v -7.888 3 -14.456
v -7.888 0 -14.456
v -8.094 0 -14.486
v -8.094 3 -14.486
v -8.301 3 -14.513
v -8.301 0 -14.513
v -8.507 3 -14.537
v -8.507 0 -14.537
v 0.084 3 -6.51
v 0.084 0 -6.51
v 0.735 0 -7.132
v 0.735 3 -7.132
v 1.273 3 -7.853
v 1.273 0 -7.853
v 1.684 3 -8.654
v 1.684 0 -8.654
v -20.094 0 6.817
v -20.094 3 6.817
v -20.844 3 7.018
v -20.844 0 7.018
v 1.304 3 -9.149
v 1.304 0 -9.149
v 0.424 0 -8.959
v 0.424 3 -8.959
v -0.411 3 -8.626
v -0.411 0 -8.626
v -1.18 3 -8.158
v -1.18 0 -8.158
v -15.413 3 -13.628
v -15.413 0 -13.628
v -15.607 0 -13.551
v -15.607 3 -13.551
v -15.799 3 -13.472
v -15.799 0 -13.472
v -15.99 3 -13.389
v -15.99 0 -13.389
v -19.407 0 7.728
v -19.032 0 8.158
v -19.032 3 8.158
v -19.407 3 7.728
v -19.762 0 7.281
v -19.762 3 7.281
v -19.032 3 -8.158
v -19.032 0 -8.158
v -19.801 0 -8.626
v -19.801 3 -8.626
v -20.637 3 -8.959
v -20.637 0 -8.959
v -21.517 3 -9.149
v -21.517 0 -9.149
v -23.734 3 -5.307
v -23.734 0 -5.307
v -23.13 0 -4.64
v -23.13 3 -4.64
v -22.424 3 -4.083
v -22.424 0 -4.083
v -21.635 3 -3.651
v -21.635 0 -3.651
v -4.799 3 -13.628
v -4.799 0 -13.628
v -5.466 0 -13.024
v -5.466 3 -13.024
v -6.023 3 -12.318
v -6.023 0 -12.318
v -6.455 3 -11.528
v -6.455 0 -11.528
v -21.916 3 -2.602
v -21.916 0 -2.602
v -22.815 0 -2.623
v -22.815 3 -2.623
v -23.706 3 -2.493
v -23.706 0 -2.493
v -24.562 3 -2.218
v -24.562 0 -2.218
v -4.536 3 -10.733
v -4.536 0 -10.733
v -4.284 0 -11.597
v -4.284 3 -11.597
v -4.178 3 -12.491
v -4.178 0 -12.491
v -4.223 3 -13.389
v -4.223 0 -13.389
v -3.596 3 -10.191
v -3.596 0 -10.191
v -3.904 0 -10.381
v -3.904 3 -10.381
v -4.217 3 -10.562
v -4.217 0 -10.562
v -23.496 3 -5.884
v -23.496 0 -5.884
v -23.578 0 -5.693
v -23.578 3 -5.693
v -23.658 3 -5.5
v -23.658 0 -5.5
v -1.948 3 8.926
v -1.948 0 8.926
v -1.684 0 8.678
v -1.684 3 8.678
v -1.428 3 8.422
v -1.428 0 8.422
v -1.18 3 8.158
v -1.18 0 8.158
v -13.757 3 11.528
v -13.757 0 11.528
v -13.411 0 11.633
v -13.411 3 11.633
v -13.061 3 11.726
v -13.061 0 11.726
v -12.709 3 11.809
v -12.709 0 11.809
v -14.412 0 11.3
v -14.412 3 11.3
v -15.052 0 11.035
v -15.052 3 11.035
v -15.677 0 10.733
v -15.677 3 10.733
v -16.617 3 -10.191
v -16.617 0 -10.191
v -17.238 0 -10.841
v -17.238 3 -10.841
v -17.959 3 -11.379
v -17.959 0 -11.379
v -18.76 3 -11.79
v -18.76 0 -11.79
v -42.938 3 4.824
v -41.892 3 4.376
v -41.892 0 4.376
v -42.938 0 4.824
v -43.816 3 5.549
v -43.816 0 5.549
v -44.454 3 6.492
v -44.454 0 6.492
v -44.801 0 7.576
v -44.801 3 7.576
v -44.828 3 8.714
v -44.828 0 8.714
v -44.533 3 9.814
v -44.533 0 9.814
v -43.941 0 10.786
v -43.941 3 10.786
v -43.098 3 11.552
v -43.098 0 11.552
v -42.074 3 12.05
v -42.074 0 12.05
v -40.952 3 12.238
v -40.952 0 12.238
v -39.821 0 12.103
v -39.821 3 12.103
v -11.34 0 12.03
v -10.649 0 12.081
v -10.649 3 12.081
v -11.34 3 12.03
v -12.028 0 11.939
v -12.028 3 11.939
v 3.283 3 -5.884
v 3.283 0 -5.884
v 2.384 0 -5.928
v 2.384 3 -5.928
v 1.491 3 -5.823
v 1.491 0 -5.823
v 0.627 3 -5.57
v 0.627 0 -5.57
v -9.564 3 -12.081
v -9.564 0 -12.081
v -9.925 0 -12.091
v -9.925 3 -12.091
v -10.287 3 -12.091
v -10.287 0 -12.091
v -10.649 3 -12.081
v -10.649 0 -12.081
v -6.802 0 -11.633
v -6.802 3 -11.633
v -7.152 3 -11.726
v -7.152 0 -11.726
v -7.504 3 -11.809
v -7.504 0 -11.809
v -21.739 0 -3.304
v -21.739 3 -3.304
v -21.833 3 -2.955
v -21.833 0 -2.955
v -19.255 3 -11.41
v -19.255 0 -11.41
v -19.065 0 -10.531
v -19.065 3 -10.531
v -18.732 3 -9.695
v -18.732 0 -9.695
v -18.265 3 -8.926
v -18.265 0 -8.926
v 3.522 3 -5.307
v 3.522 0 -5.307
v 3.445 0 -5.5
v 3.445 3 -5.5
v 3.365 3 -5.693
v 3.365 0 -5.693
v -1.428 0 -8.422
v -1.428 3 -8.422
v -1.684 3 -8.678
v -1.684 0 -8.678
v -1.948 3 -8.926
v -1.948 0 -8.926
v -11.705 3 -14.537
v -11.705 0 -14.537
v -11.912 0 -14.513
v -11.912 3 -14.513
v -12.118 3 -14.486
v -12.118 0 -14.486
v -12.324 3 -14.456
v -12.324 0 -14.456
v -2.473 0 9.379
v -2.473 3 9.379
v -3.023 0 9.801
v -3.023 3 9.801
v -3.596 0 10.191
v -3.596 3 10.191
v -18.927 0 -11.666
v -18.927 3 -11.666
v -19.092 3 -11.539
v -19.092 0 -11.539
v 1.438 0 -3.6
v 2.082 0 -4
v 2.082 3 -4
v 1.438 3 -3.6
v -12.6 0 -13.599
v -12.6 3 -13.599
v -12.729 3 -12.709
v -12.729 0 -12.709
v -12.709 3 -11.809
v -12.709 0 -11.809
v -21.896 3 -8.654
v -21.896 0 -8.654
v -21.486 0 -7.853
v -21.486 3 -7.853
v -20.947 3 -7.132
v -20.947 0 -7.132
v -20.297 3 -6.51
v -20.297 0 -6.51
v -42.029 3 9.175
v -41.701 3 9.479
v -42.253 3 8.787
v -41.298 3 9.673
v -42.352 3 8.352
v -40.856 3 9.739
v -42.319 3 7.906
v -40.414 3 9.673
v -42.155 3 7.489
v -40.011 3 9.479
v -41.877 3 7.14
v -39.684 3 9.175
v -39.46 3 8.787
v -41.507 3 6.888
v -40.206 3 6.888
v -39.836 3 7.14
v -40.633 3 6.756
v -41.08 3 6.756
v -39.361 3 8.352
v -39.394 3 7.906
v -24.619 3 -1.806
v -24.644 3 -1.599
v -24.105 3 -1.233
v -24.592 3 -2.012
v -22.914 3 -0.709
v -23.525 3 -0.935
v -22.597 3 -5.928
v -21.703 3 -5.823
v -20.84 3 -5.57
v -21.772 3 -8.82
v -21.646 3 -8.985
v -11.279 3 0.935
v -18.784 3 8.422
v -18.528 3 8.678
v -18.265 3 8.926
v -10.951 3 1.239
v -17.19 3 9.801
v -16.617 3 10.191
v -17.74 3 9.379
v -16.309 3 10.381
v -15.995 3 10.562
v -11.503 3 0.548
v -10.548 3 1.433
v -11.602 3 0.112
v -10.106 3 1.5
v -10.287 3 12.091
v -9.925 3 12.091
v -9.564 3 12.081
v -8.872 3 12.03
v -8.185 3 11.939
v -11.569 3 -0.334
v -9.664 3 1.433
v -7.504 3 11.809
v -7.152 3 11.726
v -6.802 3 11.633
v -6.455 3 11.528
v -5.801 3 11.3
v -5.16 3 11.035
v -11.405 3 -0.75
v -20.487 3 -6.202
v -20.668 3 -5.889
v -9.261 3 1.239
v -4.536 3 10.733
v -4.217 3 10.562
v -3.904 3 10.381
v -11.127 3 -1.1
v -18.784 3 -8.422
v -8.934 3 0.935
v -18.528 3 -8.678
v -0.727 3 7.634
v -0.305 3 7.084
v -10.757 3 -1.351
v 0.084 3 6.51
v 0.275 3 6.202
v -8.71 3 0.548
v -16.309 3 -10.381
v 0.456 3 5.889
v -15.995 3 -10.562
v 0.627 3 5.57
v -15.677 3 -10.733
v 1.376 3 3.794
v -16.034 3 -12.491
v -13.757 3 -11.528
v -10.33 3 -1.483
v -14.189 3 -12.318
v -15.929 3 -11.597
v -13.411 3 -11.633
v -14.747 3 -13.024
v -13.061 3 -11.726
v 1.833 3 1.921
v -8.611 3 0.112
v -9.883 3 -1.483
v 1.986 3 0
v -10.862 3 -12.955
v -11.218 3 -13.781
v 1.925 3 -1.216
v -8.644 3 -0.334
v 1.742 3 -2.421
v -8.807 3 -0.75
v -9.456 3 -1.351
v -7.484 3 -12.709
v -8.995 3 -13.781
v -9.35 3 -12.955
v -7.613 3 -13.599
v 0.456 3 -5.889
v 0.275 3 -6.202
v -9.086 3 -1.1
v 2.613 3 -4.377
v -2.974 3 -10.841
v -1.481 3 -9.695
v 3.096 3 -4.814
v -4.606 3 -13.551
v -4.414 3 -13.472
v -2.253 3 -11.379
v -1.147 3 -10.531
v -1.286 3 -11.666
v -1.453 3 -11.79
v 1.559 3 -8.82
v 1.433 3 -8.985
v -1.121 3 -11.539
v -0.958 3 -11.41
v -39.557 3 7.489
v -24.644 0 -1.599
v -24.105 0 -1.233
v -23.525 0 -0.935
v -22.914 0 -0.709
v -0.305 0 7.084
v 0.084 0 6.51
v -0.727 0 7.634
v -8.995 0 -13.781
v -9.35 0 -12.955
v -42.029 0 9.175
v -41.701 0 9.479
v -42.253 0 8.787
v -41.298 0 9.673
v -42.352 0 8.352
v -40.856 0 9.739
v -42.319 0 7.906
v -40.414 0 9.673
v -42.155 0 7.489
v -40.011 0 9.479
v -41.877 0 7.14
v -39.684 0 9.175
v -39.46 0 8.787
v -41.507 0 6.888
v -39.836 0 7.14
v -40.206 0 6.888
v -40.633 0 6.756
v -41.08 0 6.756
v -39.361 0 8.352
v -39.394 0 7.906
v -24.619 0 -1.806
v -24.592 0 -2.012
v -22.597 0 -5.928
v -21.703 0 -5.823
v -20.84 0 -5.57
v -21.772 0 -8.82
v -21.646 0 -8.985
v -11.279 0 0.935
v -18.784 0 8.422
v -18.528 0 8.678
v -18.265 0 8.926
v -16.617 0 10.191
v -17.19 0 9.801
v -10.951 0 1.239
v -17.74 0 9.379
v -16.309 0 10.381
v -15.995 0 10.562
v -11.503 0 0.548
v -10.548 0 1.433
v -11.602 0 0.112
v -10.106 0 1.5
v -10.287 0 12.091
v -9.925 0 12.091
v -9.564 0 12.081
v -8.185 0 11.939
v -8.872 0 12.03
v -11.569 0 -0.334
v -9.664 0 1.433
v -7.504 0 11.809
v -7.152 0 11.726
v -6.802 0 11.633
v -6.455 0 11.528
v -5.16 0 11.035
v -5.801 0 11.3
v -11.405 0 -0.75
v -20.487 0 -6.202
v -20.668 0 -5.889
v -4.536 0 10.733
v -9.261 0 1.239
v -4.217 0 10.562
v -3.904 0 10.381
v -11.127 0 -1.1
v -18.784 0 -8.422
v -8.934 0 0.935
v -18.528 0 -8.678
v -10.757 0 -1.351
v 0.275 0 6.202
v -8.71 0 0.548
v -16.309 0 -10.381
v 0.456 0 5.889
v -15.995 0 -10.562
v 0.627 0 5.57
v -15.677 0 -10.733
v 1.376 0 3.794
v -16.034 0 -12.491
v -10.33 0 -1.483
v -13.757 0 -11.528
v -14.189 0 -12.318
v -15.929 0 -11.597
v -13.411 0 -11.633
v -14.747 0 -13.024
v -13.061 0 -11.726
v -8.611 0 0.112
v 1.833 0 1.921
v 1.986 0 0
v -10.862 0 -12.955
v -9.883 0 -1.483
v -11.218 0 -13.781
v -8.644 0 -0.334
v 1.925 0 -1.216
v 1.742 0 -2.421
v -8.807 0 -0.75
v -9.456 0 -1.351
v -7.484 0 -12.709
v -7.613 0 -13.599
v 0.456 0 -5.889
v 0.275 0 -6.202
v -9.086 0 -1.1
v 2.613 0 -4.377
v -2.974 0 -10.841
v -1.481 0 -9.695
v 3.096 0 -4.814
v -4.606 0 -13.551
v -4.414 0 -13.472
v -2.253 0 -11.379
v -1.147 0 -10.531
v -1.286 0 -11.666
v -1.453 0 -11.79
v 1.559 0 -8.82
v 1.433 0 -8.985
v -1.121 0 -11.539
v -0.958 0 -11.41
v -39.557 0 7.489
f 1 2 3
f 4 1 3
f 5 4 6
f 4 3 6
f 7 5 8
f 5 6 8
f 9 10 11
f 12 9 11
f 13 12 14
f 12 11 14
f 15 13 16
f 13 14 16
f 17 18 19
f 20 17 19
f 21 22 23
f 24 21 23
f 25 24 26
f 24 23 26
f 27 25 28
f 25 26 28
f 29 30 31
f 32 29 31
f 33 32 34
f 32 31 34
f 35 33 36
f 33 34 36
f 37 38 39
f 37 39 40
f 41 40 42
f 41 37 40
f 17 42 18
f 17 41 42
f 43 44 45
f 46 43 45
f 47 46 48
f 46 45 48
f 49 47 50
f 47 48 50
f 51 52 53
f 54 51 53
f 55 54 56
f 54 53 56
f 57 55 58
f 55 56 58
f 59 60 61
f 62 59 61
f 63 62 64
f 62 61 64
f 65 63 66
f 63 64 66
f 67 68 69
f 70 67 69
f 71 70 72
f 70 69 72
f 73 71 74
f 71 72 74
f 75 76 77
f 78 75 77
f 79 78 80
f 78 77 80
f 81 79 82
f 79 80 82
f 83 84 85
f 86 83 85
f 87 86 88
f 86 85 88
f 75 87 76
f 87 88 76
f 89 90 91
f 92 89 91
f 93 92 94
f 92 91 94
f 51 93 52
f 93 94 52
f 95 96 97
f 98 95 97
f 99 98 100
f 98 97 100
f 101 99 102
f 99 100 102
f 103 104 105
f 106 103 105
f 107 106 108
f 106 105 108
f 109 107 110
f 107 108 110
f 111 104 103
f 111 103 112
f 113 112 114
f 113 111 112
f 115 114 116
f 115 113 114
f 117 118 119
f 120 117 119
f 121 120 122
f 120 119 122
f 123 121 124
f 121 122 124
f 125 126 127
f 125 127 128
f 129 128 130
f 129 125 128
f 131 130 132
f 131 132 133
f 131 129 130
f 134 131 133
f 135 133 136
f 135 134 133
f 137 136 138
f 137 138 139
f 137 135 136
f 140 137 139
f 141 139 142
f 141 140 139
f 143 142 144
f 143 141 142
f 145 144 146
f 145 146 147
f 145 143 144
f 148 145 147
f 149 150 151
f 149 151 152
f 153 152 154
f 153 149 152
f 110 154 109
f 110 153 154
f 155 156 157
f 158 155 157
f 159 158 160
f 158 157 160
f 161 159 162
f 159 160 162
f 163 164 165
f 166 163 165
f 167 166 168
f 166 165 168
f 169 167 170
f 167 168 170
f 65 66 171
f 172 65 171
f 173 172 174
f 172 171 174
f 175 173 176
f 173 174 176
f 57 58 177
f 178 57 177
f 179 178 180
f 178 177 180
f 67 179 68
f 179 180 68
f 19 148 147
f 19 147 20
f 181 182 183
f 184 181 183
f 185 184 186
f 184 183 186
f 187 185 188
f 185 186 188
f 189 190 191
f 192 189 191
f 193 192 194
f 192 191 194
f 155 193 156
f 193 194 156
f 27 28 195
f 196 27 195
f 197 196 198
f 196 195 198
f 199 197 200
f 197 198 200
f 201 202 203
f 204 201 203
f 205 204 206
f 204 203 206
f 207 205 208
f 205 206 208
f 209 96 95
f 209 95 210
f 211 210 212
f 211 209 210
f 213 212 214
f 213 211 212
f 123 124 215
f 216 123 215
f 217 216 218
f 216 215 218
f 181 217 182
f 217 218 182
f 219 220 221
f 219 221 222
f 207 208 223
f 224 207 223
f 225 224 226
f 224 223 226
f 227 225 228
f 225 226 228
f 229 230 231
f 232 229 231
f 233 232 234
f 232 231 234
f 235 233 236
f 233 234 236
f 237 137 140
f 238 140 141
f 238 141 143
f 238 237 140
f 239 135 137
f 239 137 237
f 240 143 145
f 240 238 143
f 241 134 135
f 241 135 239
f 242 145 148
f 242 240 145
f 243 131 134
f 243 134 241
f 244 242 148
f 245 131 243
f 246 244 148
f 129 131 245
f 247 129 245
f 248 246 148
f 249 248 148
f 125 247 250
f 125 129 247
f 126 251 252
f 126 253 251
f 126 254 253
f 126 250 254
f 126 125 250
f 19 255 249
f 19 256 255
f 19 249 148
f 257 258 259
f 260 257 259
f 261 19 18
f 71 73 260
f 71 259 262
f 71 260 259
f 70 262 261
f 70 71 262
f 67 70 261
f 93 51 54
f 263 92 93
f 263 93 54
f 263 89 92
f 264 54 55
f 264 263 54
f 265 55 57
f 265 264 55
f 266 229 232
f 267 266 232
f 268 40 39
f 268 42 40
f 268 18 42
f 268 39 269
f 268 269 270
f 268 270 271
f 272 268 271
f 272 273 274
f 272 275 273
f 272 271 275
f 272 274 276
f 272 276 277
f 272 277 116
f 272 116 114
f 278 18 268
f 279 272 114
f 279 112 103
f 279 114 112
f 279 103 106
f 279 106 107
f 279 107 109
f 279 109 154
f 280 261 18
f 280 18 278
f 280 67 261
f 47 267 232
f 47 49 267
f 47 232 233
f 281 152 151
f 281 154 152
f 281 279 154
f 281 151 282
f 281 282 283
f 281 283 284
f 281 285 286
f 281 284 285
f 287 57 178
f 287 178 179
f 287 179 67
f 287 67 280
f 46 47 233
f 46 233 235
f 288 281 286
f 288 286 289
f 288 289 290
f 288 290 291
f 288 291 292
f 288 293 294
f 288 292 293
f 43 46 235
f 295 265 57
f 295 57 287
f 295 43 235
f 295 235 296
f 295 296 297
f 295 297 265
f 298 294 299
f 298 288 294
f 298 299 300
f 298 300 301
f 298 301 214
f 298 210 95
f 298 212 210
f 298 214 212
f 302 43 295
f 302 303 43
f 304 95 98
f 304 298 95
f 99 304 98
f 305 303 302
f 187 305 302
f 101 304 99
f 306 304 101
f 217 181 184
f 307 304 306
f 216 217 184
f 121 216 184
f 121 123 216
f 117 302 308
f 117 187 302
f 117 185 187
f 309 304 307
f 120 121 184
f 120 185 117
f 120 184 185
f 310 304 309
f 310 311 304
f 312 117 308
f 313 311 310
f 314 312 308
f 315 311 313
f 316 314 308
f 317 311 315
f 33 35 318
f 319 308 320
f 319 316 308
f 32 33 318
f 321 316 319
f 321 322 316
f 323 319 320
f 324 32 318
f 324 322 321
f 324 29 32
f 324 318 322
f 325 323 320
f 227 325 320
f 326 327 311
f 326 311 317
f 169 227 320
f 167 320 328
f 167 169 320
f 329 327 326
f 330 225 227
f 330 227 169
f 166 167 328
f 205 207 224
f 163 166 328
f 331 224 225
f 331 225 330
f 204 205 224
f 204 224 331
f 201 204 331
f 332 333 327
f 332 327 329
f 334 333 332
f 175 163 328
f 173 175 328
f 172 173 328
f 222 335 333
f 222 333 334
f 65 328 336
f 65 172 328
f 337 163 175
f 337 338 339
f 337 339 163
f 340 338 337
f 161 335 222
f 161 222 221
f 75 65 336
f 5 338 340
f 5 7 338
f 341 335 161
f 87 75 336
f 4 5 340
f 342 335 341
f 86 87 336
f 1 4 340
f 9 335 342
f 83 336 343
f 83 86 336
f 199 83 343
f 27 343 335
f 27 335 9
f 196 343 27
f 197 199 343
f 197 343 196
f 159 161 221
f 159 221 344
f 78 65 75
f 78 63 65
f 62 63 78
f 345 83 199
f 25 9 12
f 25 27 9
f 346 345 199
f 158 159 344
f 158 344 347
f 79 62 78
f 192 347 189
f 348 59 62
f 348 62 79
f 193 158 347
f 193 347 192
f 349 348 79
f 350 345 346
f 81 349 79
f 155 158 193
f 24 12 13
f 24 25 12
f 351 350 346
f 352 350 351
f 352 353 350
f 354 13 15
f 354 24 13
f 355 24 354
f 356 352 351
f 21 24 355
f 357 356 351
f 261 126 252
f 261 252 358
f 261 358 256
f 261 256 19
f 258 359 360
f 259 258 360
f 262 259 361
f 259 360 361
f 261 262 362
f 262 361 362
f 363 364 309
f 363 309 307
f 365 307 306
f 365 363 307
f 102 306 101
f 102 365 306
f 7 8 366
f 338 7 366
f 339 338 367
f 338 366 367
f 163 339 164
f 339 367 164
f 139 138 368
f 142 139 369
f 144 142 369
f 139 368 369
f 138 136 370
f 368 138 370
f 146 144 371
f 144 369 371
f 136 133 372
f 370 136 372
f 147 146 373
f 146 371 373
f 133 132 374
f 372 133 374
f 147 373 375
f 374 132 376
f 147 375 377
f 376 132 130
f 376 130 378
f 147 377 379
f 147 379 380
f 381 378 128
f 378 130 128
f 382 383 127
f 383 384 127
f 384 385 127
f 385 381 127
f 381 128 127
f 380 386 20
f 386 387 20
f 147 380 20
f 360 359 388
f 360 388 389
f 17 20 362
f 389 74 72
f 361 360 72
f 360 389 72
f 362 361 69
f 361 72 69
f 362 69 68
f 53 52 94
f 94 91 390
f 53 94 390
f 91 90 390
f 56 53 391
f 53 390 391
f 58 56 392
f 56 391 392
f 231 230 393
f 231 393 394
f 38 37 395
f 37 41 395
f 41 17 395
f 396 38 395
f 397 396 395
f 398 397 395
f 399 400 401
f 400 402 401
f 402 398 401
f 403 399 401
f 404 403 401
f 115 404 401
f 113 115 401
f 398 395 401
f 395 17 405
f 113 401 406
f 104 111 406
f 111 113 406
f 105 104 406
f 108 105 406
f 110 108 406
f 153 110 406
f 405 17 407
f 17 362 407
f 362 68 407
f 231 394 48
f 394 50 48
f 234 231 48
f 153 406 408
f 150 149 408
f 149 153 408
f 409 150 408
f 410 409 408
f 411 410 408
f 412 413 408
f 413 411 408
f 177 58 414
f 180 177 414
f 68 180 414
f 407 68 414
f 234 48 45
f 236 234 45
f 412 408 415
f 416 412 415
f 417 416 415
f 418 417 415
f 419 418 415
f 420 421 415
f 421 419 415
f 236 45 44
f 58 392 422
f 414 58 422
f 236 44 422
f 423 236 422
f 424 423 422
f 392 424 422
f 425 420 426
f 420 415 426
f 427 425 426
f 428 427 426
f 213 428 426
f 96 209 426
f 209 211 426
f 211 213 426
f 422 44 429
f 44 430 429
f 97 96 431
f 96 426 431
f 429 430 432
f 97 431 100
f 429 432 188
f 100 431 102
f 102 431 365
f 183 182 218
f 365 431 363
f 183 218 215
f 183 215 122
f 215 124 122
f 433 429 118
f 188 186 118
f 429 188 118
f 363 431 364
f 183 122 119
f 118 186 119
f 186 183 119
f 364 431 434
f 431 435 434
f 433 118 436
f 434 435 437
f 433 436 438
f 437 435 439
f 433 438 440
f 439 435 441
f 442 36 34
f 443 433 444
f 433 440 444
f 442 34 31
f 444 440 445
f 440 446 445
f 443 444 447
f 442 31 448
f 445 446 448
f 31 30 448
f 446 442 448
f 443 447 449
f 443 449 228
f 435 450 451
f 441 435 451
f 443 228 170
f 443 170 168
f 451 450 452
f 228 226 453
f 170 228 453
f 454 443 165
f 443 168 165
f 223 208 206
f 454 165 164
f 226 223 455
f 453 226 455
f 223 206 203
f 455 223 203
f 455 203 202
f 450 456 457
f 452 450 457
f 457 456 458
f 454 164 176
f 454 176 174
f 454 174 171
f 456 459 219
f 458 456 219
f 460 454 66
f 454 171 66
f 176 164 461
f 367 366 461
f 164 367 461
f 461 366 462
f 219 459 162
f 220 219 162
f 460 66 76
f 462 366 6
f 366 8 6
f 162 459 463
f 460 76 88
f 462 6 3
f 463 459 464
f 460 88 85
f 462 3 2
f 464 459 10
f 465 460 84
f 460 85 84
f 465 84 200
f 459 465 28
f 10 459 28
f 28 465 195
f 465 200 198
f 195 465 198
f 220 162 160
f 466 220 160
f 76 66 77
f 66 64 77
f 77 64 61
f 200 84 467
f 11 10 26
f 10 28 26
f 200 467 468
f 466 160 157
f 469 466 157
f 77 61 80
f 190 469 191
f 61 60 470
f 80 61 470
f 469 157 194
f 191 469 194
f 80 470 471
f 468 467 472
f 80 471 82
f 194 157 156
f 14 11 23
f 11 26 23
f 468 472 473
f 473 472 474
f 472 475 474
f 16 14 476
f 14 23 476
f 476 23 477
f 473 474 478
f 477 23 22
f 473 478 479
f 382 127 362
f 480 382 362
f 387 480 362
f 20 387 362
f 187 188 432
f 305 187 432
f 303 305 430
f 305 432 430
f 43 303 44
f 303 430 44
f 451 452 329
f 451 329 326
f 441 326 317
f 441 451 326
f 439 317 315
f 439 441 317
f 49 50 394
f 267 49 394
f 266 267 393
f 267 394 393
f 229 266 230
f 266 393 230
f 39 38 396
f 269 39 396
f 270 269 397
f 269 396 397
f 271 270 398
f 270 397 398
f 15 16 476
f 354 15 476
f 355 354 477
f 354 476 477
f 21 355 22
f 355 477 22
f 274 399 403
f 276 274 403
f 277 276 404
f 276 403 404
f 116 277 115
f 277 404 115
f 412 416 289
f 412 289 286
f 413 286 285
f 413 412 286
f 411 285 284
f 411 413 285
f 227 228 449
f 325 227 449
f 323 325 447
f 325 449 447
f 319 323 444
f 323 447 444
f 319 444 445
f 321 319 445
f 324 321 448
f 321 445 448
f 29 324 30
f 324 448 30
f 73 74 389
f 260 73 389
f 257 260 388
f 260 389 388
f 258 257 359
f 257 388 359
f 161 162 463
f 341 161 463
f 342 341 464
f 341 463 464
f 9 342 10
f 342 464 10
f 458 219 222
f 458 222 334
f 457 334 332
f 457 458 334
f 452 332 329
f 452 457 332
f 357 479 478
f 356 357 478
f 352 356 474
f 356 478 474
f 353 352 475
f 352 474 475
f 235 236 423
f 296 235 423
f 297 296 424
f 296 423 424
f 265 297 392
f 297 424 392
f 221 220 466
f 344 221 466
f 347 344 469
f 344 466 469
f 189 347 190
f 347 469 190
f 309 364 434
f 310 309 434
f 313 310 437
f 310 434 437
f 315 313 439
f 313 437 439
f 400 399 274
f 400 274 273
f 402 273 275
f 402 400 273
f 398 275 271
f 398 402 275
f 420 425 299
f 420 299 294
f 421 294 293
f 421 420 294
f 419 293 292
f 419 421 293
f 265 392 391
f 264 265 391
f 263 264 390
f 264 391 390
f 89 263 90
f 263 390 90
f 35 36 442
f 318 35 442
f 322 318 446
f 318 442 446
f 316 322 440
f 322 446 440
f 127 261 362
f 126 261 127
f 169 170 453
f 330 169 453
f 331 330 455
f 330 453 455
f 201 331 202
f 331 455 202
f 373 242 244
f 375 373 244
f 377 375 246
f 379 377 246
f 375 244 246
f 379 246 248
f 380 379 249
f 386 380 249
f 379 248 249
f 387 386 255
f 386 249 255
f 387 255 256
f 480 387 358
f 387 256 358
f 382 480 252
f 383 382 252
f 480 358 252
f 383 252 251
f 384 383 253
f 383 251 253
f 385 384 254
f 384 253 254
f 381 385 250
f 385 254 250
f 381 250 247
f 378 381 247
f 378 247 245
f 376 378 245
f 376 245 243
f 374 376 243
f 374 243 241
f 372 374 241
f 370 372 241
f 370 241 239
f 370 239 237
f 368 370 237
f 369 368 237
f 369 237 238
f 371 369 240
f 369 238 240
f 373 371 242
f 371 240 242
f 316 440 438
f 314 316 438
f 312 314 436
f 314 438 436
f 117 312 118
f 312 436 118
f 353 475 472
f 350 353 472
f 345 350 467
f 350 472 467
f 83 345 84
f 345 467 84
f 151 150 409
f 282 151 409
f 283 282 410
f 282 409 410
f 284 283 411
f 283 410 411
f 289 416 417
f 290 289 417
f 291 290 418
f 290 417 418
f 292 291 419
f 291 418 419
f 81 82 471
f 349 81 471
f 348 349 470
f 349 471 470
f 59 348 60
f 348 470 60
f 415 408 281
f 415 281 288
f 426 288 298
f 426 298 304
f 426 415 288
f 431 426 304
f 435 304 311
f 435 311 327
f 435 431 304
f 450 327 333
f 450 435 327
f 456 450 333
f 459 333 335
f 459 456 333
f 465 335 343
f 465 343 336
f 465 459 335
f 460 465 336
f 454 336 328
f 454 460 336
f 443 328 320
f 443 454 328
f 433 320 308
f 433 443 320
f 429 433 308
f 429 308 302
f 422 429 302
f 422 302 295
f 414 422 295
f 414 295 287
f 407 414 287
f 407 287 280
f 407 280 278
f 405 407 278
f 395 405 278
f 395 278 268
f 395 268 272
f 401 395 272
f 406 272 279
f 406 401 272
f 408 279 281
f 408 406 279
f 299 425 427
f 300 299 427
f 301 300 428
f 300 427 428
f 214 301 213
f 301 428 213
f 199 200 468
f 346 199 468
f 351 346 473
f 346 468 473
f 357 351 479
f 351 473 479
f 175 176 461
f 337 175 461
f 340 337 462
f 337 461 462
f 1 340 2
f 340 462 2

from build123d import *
from build123d.topology import SkipClean

# Parameters (mm, degrees)
SKETCH1_R           = 1.5
BOSS_EXTRUDE1_DEPTH = 3
SKETCH3_R           = 1.5
BOSS_EXTRUDE2_DEPTH = 3
CUT_EXTRUDE1_START  = -3
CUT_EXTRUDE1_DEPTH  = 3


with BuildPart() as part:
    # Sketch1 → Boss-Extrude1 (new body)
    with BuildSketch(Plane(origin=(0, 0, 0), x_dir=(1, 0, 0), z_dir=(0, 1, 0))):
        with BuildLine():
            Line((20.643657446, 4), (2.081641936, 4))
            ThreePointArc((2.081641936, 4), (2.861028333, 4.588201733), (3.521749436, 5.30713988))
            ThreePointArc((3.521749436, 5.30713988), (3.405395609, 5.596745198), (3.282888305, 5.883801663))
            ThreePointArc((3.282888305, 5.883801663), (1.93527598, 5.894040025), (0.627094961, 5.57027124))
            ThreePointArc((0.627094961, 5.57027124), (0.366286148, 6.046375), (0.084372603, 6.510293938))
            ThreePointArc((0.084372603, 6.510293938), (1.018855105, 7.48132754), (1.683794586, 8.65351323))
            ThreePointArc((1.683794586, 8.65351323), (1.496450048, 8.903135899), (1.303821399, 9.148703928))
            ThreePointArc((1.303821399, 9.148703928), (-0.000522033, 8.809805691), (-1.180330337, 8.158486898))
            ThreePointArc((-1.180330337, 8.158486898), (-1.555477026, 8.550865528), (-1.947855656, 8.926012217))
            ThreePointArc((-1.947855656, 8.926012217), (-1.296536862, 10.105820521), (-0.957638625, 11.410163953))
            ThreePointArc((-0.957638625, 11.410163953), (-1.203206655, 11.602792602), (-1.452829324, 11.79013714))
            ThreePointArc((-1.452829324, 11.79013714), (-2.625015014, 11.125197659), (-3.596048616, 10.190715157))
            ThreePointArc((-3.596048616, 10.190715157), (-4.059967554, 10.472628702), (-4.536071314, 10.733437515))
            ThreePointArc((-4.536071314, 10.733437515), (-4.212302529, 12.041618533), (-4.222540891, 13.389230859))
            ThreePointArc((-4.222540891, 13.389230859), (-4.509597355, 13.511738163), (-4.799202674, 13.62809199))
            ThreePointArc((-4.799202674, 13.62809199), (-5.759348103, 12.682425791), (-6.455432668, 11.528463019))
            ThreePointArc((-6.455432668, 11.528463019), (-6.976508546, 11.680699536), (-7.503891752, 11.809396783))
            ThreePointArc((-7.503891752, 11.809396783), (-7.529737283, 13.156800143), (-7.888414517, 14.455843809))
            ThreePointArc((-7.888414517, 14.455843809), (-8.197396993, 14.499881098), (-8.507248835, 14.537314892))
            ThreePointArc((-8.507248835, 14.537314892), (-9.18992168, 13.375367565), (-9.563620196, 12.080565177))
            ThreePointArc((-9.563620196, 12.080565177), (-10.106342554, 12.09275), (-10.649064912, 12.080565177))
            ThreePointArc((-10.649064912, 12.080565177), (-11.022763428, 13.375367565), (-11.705436272, 14.537314892))
            ThreePointArc((-11.705436272, 14.537314892), (-12.015288115, 14.499881098), (-12.324270591, 14.455843809))
            ThreePointArc((-12.324270591, 14.455843809), (-12.682947825, 13.156800143), (-12.708793355, 11.809396783))
            ThreePointArc((-12.708793355, 11.809396783), (-13.236176561, 11.680699536), (-13.757252439, 11.528463019))
            ThreePointArc((-13.757252439, 11.528463019), (-14.453337005, 12.682425791), (-15.413482434, 13.62809199))
            ThreePointArc((-15.413482434, 13.62809199), (-15.703087752, 13.511738163), (-15.990144217, 13.389230859))
            ThreePointArc((-15.990144217, 13.389230859), (-16.000382579, 12.041618533), (-15.676613793, 10.733437515))
            ThreePointArc((-15.676613793, 10.733437515), (-16.152717554, 10.472628702), (-16.616636492, 10.190715157))
            ThreePointArc((-16.616636492, 10.190715157), (-17.587670094, 11.125197659), (-18.759855783, 11.79013714))
            ThreePointArc((-18.759855783, 11.79013714), (-19.009478453, 11.602792602), (-19.255046482, 11.410163953))
            ThreePointArc((-19.255046482, 11.410163953), (-18.916148245, 10.105820521), (-18.264829452, 8.926012217))
            ThreePointArc((-18.264829452, 8.926012217), (-18.657208082, 8.550865528), (-19.032354771, 8.158486898))
            ThreePointArc((-19.032354771, 8.158486898), (-20.212163074, 8.809805691), (-21.516506507, 9.148703928))
            ThreePointArc((-21.516506507, 9.148703928), (-21.709135156, 8.903135899), (-21.896479694, 8.65351323))
            ThreePointArc((-21.896479694, 8.65351323), (-21.231540213, 7.48132754), (-20.297057711, 6.510293938))
            ThreePointArc((-20.297057711, 6.510293938), (-20.578971255, 6.046375), (-20.839780068, 5.57027124))
            ThreePointArc((-20.839780068, 5.57027124), (-22.147961087, 5.894040025), (-23.495573413, 5.883801663))
            ThreePointArc((-23.495573413, 5.883801663), (-23.618080717, 5.596745198), (-23.734434544, 5.30713988))
            ThreePointArc((-23.734434544, 5.30713988), (-22.788768345, 4.346994451), (-21.634805572, 3.650909885))
            ThreePointArc((-21.634805572, 3.650909885), (-21.78704209, 3.129834008), (-21.915739337, 2.602450802))
            ThreePointArc((-21.915739337, 2.602450802), (-23.263142697, 2.576605271), (-24.562186363, 2.217928037))
            ThreePointArc((-24.562186363, 2.217928037), (-24.606223651, 1.908945561), (-24.643657446, 1.599093719))
            ThreePointArc((-24.643657446, 1.599093719), (-23.481710119, 0.916420874), (-22.186907731, 0.542722358))
            ThreePointArc((-22.186907731, 0.542722358), (-22.199092554, 0), (-22.186907731, -0.542722358))
            ThreePointArc((-22.186907731, -0.542722358), (-23.481710119, -0.916420874), (-24.643657446, -1.599093719))
            ThreePointArc((-24.643657446, -1.599093719), (-24.606223651, -1.908945561), (-24.562186363, -2.217928037))
            ThreePointArc((-24.562186363, -2.217928037), (-23.263142697, -2.576605271), (-21.915739337, -2.602450802))
            ThreePointArc((-21.915739337, -2.602450802), (-21.78704209, -3.129834008), (-21.634805572, -3.650909885))
            ThreePointArc((-21.634805572, -3.650909885), (-22.788768345, -4.346994451), (-23.734434544, -5.30713988))
            ThreePointArc((-23.734434544, -5.30713988), (-23.618080717, -5.596745198), (-23.495573413, -5.883801663))
            ThreePointArc((-23.495573413, -5.883801663), (-22.147961087, -5.894040025), (-20.839780068, -5.57027124))
            ThreePointArc((-20.839780068, -5.57027124), (-20.578971255, -6.046375), (-20.297057711, -6.510293938))
            ThreePointArc((-20.297057711, -6.510293938), (-21.231540213, -7.48132754), (-21.896479694, -8.65351323))
            ThreePointArc((-21.896479694, -8.65351323), (-21.709135156, -8.903135899), (-21.516506507, -9.148703928))
            ThreePointArc((-21.516506507, -9.148703928), (-20.212163074, -8.809805691), (-19.032354771, -8.158486898))
            ThreePointArc((-19.032354771, -8.158486898), (-18.657208082, -8.550865528), (-18.264829452, -8.926012217))
            ThreePointArc((-18.264829452, -8.926012217), (-18.916148245, -10.105820521), (-19.255046482, -11.410163953))
            ThreePointArc((-19.255046482, -11.410163953), (-19.009478453, -11.602792602), (-18.759855783, -11.79013714))
            ThreePointArc((-18.759855783, -11.79013714), (-17.587670094, -11.125197659), (-16.616636492, -10.190715157))
            ThreePointArc((-16.616636492, -10.190715157), (-16.152717554, -10.472628702), (-15.676613793, -10.733437515))
            ThreePointArc((-15.676613793, -10.733437515), (-16.000382579, -12.041618533), (-15.990144217, -13.389230859))
            ThreePointArc((-15.990144217, -13.389230859), (-15.703087752, -13.511738163), (-15.413482434, -13.62809199))
            ThreePointArc((-15.413482434, -13.62809199), (-14.453337005, -12.682425791), (-13.757252439, -11.528463019))
            ThreePointArc((-13.757252439, -11.528463019), (-13.236176561, -11.680699536), (-12.708793355, -11.809396783))
            ThreePointArc((-12.708793355, -11.809396783), (-12.682947825, -13.156800143), (-12.324270591, -14.455843809))
            ThreePointArc((-12.324270591, -14.455843809), (-12.015288115, -14.499881098), (-11.705436272, -14.537314892))
            ThreePointArc((-11.705436272, -14.537314892), (-11.022763428, -13.375367565), (-10.649064912, -12.080565177))
            ThreePointArc((-10.649064912, -12.080565177), (-10.106342554, -12.09275), (-9.563620196, -12.080565177))
            ThreePointArc((-9.563620196, -12.080565177), (-9.18992168, -13.375367565), (-8.507248835, -14.537314892))
            ThreePointArc((-8.507248835, -14.537314892), (-8.197396993, -14.499881098), (-7.888414517, -14.455843809))
            ThreePointArc((-7.888414517, -14.455843809), (-7.529737283, -13.156800143), (-7.503891752, -11.809396783))
            ThreePointArc((-7.503891752, -11.809396783), (-6.976508546, -11.680699536), (-6.455432668, -11.528463019))
            ThreePointArc((-6.455432668, -11.528463019), (-5.759348103, -12.682425791), (-4.799202674, -13.62809199))
            ThreePointArc((-4.799202674, -13.62809199), (-4.509597355, -13.511738163), (-4.222540891, -13.389230859))
            ThreePointArc((-4.222540891, -13.389230859), (-4.212302529, -12.041618533), (-4.536071314, -10.733437515))
            ThreePointArc((-4.536071314, -10.733437515), (-4.059967554, -10.472628702), (-3.596048616, -10.190715157))
            ThreePointArc((-3.596048616, -10.190715157), (-2.625015014, -11.125197659), (-1.452829324, -11.79013714))
            ThreePointArc((-1.452829324, -11.79013714), (-1.203206655, -11.602792602), (-0.957638625, -11.410163953))
            ThreePointArc((-0.957638625, -11.410163953), (-1.296536862, -10.105820521), (-1.947855656, -8.926012217))
            ThreePointArc((-1.947855656, -8.926012217), (-1.555477026, -8.550865528), (-1.180330337, -8.158486898))
            ThreePointArc((-1.180330337, -8.158486898), (-0.000522033, -8.809805691), (1.303821399, -9.148703928))
            ThreePointArc((1.303821399, -9.148703928), (1.496450048, -8.903135899), (1.683794586, -8.65351323))
            ThreePointArc((1.683794586, -8.65351323), (1.018855105, -7.48132754), (0.084372603, -6.510293938))
            ThreePointArc((0.084372603, -6.510293938), (0.366286148, -6.046375), (0.627094961, -5.57027124))
            ThreePointArc((0.627094961, -5.57027124), (1.93527598, -5.894040025), (3.282888305, -5.883801663))
            ThreePointArc((3.282888305, -5.883801663), (3.405395609, -5.596745198), (3.521749436, -5.30713988))
            ThreePointArc((3.521749436, -5.30713988), (2.861028333, -4.588201733), (2.081641936, -4))
            Line((2.081641936, -4), (20.643657446, -4))
            ThreePointArc((20.643657446, -4), (24.643657446, 0), (20.643657446, 4))
        make_face()
        with Locations(Location((-10.106342554, 0, 0), (0, 0, 270))):
            Circle(SKETCH1_R, mode=Mode.SUBTRACT)
        with Locations(Location((20.643657446, 0, 0), (0, 0, 270))):
            Circle(SKETCH1_R, mode=Mode.SUBTRACT)
    extrude(amount=BOSS_EXTRUDE1_DEPTH)

    # Sketch3 → Boss-Extrude2 (add)
    with BuildSketch(Plane(origin=(0, 3, 0), x_dir=(1, 0, 0), z_dir=(0, 1, 0))):
        with BuildLine():
            ThreePointArc((-9.071066373, -3.863703305), (-13.970045859, -1.03527618), (-11.141618734, 3.863703305))
            Line((-11.141618734, 3.863703305), (-41.891618734, -4.375734362))
            ThreePointArc((-41.891618734, -4.375734362), (-44.720045859, -9.274713848), (-39.821066373, -12.103140972))
            Line((-39.821066373, -12.103140972), (-9.071066373, -3.863703305))
        make_face()
        with Locations(Location((-40.856342554, -8.239437667, 0), (0, 0, 270))):
            Circle(SKETCH3_R, mode=Mode.SUBTRACT)
    extrude(amount=-BOSS_EXTRUDE2_DEPTH)

    # Sketch4 → Cut-Extrude1 (cut)
    with SkipClean():  # the faces are left unmerged after this step: merging them gives an invalid solid
        with BuildSketch(Plane(origin=(0, 3, 0), x_dir=(1, 0, 0), z_dir=(0, 1, 0)).offset(CUT_EXTRUDE1_START)):
            with BuildLine():
                ThreePointArc((-21.516506507, -9.148703928), (-20.212163074, -8.809805691), (-19.032354771, -8.158486898))
                ThreePointArc((-19.032354771, -8.158486898), (-19.58704562, -7.506721784), (-20.094248238, -6.817355984))
                Line((-20.094248238, -6.817355984), (-20.843755363, -7.018185813))
                ThreePointArc((-20.843755363, -7.018185813), (-21.444347002, -7.788065101), (-21.896479694, -8.65351323))
                ThreePointArc((-21.896479694, -8.65351323), (-21.709135156, -8.903135899), (-21.516506507, -9.148703928))
            make_face()
            with BuildLine():
                ThreePointArc((-18.759855783, -11.79013714), (-17.587670094, -11.125197659), (-16.616636492, -10.190715157))
                ThreePointArc((-16.616636492, -10.190715157), (-17.467942324, -9.593823606), (-18.264829452, -8.926012217))
                ThreePointArc((-18.264829452, -8.926012217), (-18.916148245, -10.105820521), (-19.255046482, -11.410163953))
                ThreePointArc((-19.255046482, -11.410163953), (-19.009478453, -11.602792602), (-18.759855783, -11.79013714))
            make_face()
            with BuildLine():
                ThreePointArc((-15.413482434, -13.62809199), (-14.453337005, -12.682425791), (-13.757252439, -11.528463019))
                ThreePointArc((-13.757252439, -11.528463019), (-14.734037631, -11.172244217), (-15.676613793, -10.733437515))
                ThreePointArc((-15.676613793, -10.733437515), (-16.000382579, -12.041618533), (-15.990144217, -13.389230859))
                ThreePointArc((-15.990144217, -13.389230859), (-15.703087752, -13.511738163), (-15.413482434, -13.62809199))
            make_face()
            with BuildLine():
                ThreePointArc((-11.705436272, -14.537314892), (-11.022763428, -13.375367565), (-10.649064912, -12.080565177))
                ThreePointArc((-10.649064912, -12.080565177), (-11.684763165, -11.989294847), (-12.708793355, -11.809396783))
                ThreePointArc((-12.708793355, -11.809396783), (-12.682947825, -13.156800143), (-12.324270591, -14.455843809))
                ThreePointArc((-12.324270591, -14.455843809), (-12.015288115, -14.499881098), (-11.705436272, -14.537314892))
            make_face()
            with BuildLine():
                ThreePointArc((-7.888414517, -14.455843809), (-7.529737283, -13.156800143), (-7.503891752, -11.809396783))
                ThreePointArc((-7.503891752, -11.809396783), (-8.527921943, -11.989294847), (-9.563620196, -12.080565177))
                ThreePointArc((-9.563620196, -12.080565177), (-9.18992168, -13.375367565), (-8.507248835, -14.537314892))
                ThreePointArc((-8.507248835, -14.537314892), (-8.197396993, -14.499881098), (-7.888414517, -14.455843809))
            make_face()
            with BuildLine():
                ThreePointArc((-4.222540891, -13.389230859), (-4.212302529, -12.041618533), (-4.536071314, -10.733437515))
                ThreePointArc((-4.536071314, -10.733437515), (-5.478647477, -11.172244217), (-6.455432668, -11.528463019))
                ThreePointArc((-6.455432668, -11.528463019), (-5.759348103, -12.682425791), (-4.799202674, -13.62809199))
                ThreePointArc((-4.799202674, -13.62809199), (-4.509597355, -13.511738163), (-4.222540891, -13.389230859))
            make_face()
            with BuildLine():
                ThreePointArc((-0.957638625, -11.410163953), (-1.296536862, -10.105820521), (-1.947855656, -8.926012217))
                ThreePointArc((-1.947855656, -8.926012217), (-2.744742783, -9.593823606), (-3.596048616, -10.190715157))
                ThreePointArc((-3.596048616, -10.190715157), (-2.625015014, -11.125197659), (-1.452829324, -11.79013714))
                ThreePointArc((-1.452829324, -11.79013714), (-1.203206655, -11.602792602), (-0.957638625, -11.410163953))
            make_face()
            with BuildLine():
                ThreePointArc((1.683794586, -8.65351323), (1.018855105, -7.48132754), (0.084372603, -6.510293938))
                ThreePointArc((0.084372603, -6.510293938), (-0.512518948, -7.361599771), (-1.180330337, -8.158486898))
                ThreePointArc((-1.180330337, -8.158486898), (-0.000522033, -8.809805691), (1.303821399, -9.148703928))
                ThreePointArc((1.303821399, -9.148703928), (1.496450048, -8.903135899), (1.683794586, -8.65351323))
            make_face()
            with BuildLine():
                ThreePointArc((20.643657446, -4), (24.643657446, 0), (20.643657446, 4))
                Line((20.643657446, 4), (2.081641936, 4))
                Line((2.081641936, 4), (1.43808022, 3.600125745))
                ThreePointArc((1.43808022, 3.600125745), (1.848539735, 1.820821801), (1.986407446, 0))
                ThreePointArc((1.986407446, 0), (1.641665343, -2.866864669), (0.627094961, -5.57027124))
                ThreePointArc((0.627094961, -5.57027124), (1.93527598, -5.894040025), (3.282888305, -5.883801663))
                ThreePointArc((3.282888305, -5.883801663), (3.405395609, -5.596745198), (3.521749436, -5.30713988))
                ThreePointArc((3.521749436, -5.30713988), (2.861028333, -4.588201733), (2.081641936, -4))
                Line((2.081641936, -4), (20.643657446, -4))
            make_face()
        extrude(amount=CUT_EXTRUDE1_DEPTH, mode=Mode.SUBTRACT)


solid = part.part
